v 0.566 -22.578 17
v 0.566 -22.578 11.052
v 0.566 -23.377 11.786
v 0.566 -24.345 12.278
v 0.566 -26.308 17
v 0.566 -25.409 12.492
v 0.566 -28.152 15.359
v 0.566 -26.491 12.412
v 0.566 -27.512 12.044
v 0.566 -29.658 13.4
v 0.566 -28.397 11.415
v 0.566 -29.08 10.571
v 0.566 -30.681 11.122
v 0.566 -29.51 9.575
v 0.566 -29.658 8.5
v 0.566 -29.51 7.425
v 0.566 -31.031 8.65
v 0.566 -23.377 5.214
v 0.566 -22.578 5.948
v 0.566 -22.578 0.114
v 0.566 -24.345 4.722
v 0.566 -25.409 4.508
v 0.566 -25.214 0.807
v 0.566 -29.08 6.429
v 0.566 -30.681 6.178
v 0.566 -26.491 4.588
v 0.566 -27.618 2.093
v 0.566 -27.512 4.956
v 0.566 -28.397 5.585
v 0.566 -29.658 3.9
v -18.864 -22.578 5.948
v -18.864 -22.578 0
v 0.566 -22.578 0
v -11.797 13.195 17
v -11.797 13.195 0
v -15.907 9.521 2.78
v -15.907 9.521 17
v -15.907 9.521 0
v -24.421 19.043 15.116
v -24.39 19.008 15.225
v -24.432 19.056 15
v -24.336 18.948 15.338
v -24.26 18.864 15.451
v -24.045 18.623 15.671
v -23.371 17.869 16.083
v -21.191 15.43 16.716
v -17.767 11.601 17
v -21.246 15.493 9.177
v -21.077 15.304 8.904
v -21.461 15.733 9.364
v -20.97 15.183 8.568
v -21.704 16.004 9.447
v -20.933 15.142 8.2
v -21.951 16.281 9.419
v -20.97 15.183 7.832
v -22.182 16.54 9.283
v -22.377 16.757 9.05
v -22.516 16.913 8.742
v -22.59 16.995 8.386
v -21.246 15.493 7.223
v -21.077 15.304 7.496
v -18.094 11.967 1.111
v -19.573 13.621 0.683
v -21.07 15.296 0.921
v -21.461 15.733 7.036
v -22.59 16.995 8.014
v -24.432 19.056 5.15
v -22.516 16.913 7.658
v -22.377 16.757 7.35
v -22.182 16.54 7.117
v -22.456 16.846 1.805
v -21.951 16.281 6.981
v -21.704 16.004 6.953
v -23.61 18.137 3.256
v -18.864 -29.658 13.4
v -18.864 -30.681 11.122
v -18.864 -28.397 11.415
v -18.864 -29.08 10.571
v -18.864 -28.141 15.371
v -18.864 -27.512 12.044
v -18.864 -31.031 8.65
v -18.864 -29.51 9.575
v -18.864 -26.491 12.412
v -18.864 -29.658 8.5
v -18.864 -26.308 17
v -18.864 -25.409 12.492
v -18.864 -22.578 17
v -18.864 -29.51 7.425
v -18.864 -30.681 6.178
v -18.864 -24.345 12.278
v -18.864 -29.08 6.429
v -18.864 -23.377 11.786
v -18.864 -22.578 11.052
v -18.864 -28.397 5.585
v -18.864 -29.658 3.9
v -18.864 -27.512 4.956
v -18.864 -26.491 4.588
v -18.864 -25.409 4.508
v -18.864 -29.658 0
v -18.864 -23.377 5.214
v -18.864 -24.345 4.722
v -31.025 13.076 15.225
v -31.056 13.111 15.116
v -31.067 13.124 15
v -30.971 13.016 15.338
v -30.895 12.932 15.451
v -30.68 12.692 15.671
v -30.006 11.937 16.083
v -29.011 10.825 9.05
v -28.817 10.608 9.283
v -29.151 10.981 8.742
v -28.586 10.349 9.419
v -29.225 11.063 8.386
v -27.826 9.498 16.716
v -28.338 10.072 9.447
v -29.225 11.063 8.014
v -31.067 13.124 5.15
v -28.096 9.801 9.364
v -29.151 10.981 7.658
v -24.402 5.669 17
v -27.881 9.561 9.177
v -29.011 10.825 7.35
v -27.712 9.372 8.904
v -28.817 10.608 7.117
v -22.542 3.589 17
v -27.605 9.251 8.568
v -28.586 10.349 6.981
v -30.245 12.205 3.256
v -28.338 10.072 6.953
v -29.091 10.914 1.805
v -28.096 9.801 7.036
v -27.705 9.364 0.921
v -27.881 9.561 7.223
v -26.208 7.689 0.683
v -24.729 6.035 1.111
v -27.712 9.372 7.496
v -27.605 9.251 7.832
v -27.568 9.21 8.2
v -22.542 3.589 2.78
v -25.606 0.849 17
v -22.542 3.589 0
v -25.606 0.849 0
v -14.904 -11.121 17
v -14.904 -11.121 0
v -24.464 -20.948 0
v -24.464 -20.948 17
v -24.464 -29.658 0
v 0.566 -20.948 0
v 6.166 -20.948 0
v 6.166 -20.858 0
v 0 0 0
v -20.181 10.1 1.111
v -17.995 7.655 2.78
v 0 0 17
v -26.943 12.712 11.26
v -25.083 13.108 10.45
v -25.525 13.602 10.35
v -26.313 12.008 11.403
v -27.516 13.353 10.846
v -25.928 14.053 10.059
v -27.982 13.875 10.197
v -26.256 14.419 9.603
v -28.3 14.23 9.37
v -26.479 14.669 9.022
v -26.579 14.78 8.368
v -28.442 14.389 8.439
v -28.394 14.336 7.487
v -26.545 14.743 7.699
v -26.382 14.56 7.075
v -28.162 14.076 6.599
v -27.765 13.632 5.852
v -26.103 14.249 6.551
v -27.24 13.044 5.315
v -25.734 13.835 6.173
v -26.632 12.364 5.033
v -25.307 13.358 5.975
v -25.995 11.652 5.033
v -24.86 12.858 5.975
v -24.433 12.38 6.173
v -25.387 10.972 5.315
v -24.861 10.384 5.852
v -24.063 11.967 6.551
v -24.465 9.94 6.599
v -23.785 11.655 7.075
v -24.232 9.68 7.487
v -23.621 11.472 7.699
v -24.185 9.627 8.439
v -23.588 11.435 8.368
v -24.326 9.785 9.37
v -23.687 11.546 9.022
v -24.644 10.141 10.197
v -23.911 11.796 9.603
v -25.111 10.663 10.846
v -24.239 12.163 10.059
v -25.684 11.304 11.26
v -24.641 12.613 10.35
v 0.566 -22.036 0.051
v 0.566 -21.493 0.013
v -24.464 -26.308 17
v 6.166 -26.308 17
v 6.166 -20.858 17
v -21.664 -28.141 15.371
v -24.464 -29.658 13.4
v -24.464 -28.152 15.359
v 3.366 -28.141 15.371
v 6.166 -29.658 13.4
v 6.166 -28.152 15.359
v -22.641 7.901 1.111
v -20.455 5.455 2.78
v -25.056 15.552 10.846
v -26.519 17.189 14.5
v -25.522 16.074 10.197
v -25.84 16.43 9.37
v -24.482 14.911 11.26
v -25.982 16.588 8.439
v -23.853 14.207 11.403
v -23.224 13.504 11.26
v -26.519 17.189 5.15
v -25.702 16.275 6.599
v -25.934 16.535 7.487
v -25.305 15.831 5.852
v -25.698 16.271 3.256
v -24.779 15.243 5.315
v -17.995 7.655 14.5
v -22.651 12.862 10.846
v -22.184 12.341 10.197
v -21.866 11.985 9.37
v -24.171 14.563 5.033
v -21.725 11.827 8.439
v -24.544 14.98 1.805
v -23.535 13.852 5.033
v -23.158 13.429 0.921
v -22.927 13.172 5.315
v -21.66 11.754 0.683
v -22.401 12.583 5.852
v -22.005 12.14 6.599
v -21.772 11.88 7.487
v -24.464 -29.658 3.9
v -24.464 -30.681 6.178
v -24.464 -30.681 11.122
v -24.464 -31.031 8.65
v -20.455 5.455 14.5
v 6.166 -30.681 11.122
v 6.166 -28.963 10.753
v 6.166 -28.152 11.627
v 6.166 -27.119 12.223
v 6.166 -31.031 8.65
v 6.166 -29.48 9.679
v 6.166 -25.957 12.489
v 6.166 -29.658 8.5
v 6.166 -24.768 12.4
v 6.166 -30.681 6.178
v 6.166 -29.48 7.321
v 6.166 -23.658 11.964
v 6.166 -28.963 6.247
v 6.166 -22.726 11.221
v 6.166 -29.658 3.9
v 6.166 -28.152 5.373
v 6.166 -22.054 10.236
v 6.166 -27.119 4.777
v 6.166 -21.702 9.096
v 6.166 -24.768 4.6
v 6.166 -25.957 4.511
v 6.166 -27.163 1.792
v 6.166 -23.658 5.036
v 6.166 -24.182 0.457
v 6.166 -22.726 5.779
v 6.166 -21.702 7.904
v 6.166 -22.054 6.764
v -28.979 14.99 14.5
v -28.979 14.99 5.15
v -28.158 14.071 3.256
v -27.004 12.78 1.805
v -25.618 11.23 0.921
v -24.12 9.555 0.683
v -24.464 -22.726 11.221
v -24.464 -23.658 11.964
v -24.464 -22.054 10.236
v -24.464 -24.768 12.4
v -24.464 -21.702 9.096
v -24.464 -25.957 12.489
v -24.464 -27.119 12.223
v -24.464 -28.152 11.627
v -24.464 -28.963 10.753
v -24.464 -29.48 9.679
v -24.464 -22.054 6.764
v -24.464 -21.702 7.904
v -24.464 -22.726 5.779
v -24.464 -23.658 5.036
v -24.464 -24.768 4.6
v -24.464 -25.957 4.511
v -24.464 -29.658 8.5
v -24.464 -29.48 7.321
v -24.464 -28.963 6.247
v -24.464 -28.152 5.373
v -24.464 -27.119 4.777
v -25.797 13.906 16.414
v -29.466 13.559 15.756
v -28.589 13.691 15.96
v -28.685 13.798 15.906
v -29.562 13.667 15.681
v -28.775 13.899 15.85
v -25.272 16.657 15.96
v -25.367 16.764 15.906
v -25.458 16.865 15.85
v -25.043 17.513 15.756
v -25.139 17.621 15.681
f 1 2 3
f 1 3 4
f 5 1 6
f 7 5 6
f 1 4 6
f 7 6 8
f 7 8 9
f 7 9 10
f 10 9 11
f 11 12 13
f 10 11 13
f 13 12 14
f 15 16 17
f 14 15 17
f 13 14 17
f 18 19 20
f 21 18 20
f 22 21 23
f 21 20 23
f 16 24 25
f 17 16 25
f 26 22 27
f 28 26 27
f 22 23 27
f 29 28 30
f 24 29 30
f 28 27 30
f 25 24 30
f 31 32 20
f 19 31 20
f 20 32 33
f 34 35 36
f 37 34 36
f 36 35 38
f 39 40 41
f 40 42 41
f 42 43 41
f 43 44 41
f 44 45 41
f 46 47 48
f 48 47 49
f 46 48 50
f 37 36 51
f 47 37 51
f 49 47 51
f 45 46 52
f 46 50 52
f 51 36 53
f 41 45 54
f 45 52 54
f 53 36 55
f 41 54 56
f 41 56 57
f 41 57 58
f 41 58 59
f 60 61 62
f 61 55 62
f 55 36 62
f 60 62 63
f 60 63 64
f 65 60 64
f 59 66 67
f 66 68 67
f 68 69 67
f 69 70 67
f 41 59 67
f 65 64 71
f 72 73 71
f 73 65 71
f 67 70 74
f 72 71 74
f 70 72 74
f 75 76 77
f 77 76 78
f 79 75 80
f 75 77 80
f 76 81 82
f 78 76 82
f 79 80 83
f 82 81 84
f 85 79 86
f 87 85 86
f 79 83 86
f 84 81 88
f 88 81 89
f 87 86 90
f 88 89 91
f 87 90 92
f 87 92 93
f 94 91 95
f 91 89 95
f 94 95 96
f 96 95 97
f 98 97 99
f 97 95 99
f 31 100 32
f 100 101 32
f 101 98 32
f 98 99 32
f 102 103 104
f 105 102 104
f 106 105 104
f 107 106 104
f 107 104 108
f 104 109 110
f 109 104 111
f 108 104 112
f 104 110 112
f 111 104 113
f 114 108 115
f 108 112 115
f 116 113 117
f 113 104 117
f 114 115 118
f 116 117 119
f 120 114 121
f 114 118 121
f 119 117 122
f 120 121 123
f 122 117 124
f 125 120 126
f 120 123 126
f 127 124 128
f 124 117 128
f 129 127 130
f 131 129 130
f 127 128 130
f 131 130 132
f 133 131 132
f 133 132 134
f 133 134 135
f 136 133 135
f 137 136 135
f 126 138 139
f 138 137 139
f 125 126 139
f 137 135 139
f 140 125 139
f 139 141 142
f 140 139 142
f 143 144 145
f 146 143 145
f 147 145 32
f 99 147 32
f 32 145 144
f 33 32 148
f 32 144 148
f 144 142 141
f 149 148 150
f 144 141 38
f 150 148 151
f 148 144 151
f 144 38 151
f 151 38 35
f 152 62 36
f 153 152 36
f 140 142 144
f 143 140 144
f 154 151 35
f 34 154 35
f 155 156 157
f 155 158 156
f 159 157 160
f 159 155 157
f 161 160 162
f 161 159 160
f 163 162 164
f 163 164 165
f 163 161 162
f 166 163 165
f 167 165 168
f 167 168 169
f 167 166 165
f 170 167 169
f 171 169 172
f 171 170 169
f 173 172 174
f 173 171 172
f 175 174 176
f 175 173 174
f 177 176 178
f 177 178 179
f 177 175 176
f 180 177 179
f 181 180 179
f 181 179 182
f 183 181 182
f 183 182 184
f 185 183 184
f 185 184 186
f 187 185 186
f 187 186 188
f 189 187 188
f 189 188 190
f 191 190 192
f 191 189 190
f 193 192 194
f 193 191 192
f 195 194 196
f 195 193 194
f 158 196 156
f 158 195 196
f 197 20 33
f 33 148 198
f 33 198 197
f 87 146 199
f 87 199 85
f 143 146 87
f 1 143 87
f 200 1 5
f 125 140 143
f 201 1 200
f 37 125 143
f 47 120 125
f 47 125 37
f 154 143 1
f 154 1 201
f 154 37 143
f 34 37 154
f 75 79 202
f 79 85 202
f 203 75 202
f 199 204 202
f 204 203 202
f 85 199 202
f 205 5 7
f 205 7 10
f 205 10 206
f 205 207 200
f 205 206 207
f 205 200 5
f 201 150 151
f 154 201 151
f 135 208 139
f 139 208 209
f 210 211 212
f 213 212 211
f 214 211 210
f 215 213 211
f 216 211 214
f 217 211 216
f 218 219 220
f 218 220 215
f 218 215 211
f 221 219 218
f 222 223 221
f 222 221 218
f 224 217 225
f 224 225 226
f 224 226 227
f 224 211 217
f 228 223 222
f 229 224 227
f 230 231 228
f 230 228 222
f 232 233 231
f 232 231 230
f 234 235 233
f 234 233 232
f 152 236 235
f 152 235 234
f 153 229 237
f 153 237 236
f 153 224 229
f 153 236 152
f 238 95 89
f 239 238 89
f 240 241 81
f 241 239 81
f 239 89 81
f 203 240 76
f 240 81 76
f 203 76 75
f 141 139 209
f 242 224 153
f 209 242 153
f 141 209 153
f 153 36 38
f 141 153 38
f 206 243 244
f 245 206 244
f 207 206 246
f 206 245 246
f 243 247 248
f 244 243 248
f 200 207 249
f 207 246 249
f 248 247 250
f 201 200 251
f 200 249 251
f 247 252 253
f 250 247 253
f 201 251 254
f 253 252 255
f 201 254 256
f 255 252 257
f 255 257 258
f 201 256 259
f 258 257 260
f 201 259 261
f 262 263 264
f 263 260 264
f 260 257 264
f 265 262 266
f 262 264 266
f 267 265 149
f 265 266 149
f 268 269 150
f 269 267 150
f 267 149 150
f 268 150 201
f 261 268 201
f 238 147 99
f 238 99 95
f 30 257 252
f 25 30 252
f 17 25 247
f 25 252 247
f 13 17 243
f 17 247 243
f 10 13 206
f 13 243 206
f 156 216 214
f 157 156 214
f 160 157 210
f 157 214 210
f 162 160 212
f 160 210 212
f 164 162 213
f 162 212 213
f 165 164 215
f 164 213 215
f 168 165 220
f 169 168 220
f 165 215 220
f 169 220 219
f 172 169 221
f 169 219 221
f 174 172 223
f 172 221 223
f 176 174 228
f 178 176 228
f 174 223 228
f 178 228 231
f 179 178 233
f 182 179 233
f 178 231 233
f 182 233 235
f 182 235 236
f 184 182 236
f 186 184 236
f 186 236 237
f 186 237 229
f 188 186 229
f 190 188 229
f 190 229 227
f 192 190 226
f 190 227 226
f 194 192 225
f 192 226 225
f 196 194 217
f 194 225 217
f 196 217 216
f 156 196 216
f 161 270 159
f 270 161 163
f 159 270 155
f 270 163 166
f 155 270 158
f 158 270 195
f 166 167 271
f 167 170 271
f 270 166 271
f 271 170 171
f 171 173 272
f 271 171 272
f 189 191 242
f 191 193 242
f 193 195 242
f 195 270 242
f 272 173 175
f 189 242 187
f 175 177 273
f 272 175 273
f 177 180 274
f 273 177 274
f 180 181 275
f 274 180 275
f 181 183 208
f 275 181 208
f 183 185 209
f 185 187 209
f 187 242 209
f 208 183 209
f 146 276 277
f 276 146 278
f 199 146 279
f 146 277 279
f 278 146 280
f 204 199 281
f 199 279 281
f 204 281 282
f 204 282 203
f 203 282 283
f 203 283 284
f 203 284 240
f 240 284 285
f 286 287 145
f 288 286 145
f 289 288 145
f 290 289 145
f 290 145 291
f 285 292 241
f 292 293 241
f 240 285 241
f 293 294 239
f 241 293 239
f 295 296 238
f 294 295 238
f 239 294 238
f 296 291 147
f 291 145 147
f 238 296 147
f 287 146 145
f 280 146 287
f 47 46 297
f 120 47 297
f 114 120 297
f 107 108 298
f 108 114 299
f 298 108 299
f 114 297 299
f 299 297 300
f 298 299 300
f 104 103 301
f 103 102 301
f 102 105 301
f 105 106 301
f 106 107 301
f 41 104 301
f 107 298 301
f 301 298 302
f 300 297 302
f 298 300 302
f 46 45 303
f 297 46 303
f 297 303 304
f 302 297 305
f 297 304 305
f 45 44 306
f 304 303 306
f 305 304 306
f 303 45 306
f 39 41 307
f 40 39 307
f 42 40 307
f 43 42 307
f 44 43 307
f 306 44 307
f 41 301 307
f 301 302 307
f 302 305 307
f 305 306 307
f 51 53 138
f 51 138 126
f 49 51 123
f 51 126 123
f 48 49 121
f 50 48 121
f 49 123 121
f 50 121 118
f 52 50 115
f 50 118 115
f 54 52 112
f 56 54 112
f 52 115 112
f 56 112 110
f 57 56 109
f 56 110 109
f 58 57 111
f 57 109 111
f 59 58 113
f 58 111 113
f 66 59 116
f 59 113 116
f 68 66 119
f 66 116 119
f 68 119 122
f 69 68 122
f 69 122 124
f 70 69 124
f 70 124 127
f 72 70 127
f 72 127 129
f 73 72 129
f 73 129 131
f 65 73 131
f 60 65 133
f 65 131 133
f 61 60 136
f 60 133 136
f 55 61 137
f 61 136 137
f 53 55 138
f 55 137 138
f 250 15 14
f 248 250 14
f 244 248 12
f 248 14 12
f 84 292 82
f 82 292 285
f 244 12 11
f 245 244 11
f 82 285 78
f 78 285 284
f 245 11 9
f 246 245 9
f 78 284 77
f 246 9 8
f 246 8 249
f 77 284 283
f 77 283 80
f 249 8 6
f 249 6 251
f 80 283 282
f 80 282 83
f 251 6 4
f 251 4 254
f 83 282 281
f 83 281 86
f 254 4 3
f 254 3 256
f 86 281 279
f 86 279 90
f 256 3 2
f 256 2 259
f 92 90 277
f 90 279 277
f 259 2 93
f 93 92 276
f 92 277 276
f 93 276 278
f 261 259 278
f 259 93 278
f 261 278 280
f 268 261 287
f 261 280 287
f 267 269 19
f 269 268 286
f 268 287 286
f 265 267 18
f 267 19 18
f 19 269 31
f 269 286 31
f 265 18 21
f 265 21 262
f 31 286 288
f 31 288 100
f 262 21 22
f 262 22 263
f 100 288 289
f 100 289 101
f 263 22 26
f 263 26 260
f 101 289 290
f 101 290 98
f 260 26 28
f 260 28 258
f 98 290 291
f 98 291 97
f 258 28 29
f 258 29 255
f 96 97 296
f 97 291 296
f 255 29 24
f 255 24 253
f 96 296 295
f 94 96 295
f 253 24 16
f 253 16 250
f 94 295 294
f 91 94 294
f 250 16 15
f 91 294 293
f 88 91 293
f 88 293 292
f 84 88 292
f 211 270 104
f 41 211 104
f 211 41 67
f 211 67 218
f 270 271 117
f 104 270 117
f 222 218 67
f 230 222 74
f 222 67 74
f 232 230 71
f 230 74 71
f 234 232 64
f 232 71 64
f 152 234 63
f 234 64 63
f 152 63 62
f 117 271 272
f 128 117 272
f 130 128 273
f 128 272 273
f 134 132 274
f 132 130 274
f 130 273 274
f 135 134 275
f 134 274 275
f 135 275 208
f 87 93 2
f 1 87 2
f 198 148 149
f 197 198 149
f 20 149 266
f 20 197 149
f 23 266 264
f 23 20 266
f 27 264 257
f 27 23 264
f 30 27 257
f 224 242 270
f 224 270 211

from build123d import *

# Parameters (mm, degrees)
BOSS_EXTRUDE1_DEPTH           = 17
CUT_EXTRUDE2_DEPTH            = 35
CUT_EXTRUDE3_DEPTH            = 30.5
CUT_EXTRUDE4_DEPTH            = 61
SKETCH6_R                     = 4
CUT_EXTRUDE5_DEPTH            = 61
CUT_EXTRUDE6_START            = -12.79
SKETCH7_W                     = 3.3
SKETCH7_H                     = 14.201279548
CUT_EXTRUDE6_DEPTH            = 12.79
SKETCH8_R                     = 1.25
CUT_EXTRUDE7_DEPTH            = 61
SKETCH9_R                     = 2.25
SKETCH9_R_2                   = 1.25
EXTRUDE_THIN1_DEPTH           = 1.75
EXTRUDE_THIN1_TAPER           = -30
EXTRUDE_THIN1_OTHER_WAY_DEPTH = 1.75
EXTRUDE_THIN1_OTHER_WAY_TAPER = -30
SKETCH10_R                    = 1.25
CUT_EXTRUDE9_DEPTH            = 43.000727623
FILLET1_SIZE                  = 10
FILLET1_SIZE_2                = 2


with BuildPart() as part:
    # Sketch1 → Boss-Extrude1 (new body)
    with BuildSketch(Plane.XY):
        Polygon((0, 0), (-11.797217655, 13.195289144), (-15.907217655, 9.520753176), (-24.431873803, 19.055654202), (-31.066793203, 13.123719901), (-22.542137055, 3.588818875), (-25.606127924, 0.849464945), (-14.904077823, -11.120869896), (-24.464229858, -20.947751043), (-24.464229858, -31.437751043), (-18.864229858, -31.437751043), (-18.864229858, -22.577751043), (0.565770142, -22.577751043), (0.565770142, -31.437751043), (6.165770142, -31.437751043), (6.165770142, -20.857751043), align=None)
    extrude(amount=BOSS_EXTRUDE1_DEPTH)

    # Sketch3 → Cut-Extrude2 (cut)
    with BuildSketch(Plane(origin=(-4.11, -3.674535968, 0), x_dir=(0, 0, -1), z_dir=(0.7454965618132088, 0.6665094720442348, 0))):
        with BuildLine():
            Line((-1.11054508, 20.98073524), (-2.78, 17.7))
            Line((-2.78, 17.7), (0.68, 17.7))
            Line((0.68, 17.7), (0.68, 32.569121824))
            Line((0.68, 32.569121824), (-17, 32.569121824))
            Line((-17, 32.569121824), (-17, 30.49))
            Line((-17, 30.49), (-5.15, 30.49))
            ThreePointArc((-5.15, 30.49), (-1.285745078, 26.518907223), (-1.11054508, 20.98073524))
        make_face()
    extrude(amount=-CUT_EXTRUDE2_DEPTH, mode=Mode.SUBTRACT)

    # Sketch4 → Cut-Extrude3 (cut, symmetric)
    with BuildSketch(Plane(origin=(-18.864229858, 0, 0), x_dir=(0, 0, -1), z_dir=(1, 0, 0))):
        with BuildLine():
            Line((-17, -26.307751043), (-17, -22.577751043))
            Line((-17, -22.577751043), (-18.338911285, -22.577751043))
            Line((-18.338911285, -22.577751043), (-18.338911285, -32.309712135))
            Line((-18.338911285, -32.309712135), (1.137649959, -32.309712135))
            Line((1.137649959, -32.309712135), (1.137649959, -22.577751043))
            Line((1.137649959, -22.577751043), (0, -22.577751043))
            Line((0, -22.577751043), (0, -29.657751043))
            Line((0, -29.657751043), (-3.9, -29.657751043))
            ThreePointArc((-3.9, -29.657751043), (-8.65, -31.031297694), (-13.4, -29.657751043))
            add(Edge.make_bspline(
                [(-13.4, -29.657751043), (-15.541480272, -28.298487281), (-17, -26.307751043)],
                knots=[0, 0, 0, 1, 1, 1], degree=2))
        make_face()
    extrude(amount=CUT_EXTRUDE3_DEPTH, both=True, mode=Mode.SUBTRACT)

    # Sketch5 → Cut-Extrude4 (cut)
    with BuildSketch(Plane.ZY.offset(-0.565770142)):
        with BuildLine():
            Line((3.9, -29.657751043), (0, -29.657751043))
            Line((0, -29.657751043), (0, -20.947751043))
            ThreePointArc((0, -20.947751043), (1.01950945, -25.719388602), (3.9, -29.657751043))
        make_face()
    extrude(amount=-CUT_EXTRUDE4_DEPTH, mode=Mode.SUBTRACT)

    # Sketch6 → Cut-Extrude5 (cut)
    with BuildSketch(Plane.ZY.offset(24.464229858)):
        with Locations(Location((8.5, -25.657751043, 0), (0, 0, 270))):
            Circle(SKETCH6_R)
    extrude(amount=-CUT_EXTRUDE5_DEPTH, mode=Mode.SUBTRACT)

    # Sketch7 → Cut-Extrude6 (cut)
    with BuildSketch(Plane(origin=(-20.321873803, 22.73019017, 0), x_dir=(0.7454965618132092, 0.6665094720442343, 0), z_dir=(-0.6665094720442343, 0.7454965618132092, 0)).offset(CUT_EXTRUDE6_START)):
        with Locations((-9.963103897, -7.399360226)):
            Rectangle(SKETCH7_W, SKETCH7_H)
    extrude(amount=CUT_EXTRUDE6_DEPTH, mode=Mode.SUBTRACT)

    # Sketch8 → Cut-Extrude7 (cut)
    with BuildSketch(Plane(origin=(-10.7449194, -9.606470269, 0), x_dir=(0, 0, 1), z_dir=(-0.7454965618132091, -0.6665094720442345, 0))):
        with Locations(Location((8.2, 26.49, 0), (0, 0, 270))):
            Circle(SKETCH8_R)
    extrude(amount=-CUT_EXTRUDE7_DEPTH, mode=Mode.SUBTRACT)

    # Sketch9 → Extrude-Thin1 (add)
    with BuildSketch(Plane(origin=(-7.4274597, -6.640503118, 0), x_dir=(0, 0, 1), z_dir=(-0.7454965618132092, -0.6665094720442343, 0))):
        with Locations((8.2, 26.49)):
            Circle(SKETCH9_R)
        with Locations((8.2, 26.49)):
            Circle(SKETCH9_R_2, mode=Mode.SUBTRACT)
    extrude(amount=EXTRUDE_THIN1_DEPTH, taper=EXTRUDE_THIN1_TAPER)

    # Sketch9 → Extrude-Thin1 other way (add)
    with BuildSketch(Plane(origin=(-7.4274597, -6.640503118, 0), x_dir=(0, 0, 1), z_dir=(-0.7454965618132092, -0.6665094720442343, 0))):
        with Locations((8.2, 26.49)):
            Circle(SKETCH9_R)
        with Locations((8.2, 26.49)):
            Circle(SKETCH9_R_2, mode=Mode.SUBTRACT)
    extrude(amount=-EXTRUDE_THIN1_OTHER_WAY_DEPTH, taper=EXTRUDE_THIN1_OTHER_WAY_TAPER)

    # Sketch10 → Cut-Extrude9 (cut, through all)
    with BuildSketch(Plane(origin=(-4.11, -3.674535968, 0), x_dir=(0, 0, -1), z_dir=(0.7454965618132088, 0.6665094720442348, 0))):
        with Locations(Location((-8.2, 26.49, 0), (0, 0, 270))):
            Circle(SKETCH10_R)
    extrude(amount=-CUT_EXTRUDE9_DEPTH, mode=Mode.SUBTRACT)

    # Fillet1
    # an asymmetric fillet: 10, 2 mm, written as the material it takes off along each edge
    with BuildSketch(Plane(origin=(-5.794459757, 35.718391003, 17), x_dir=(0.6665094720442343, -0.7454965618132092, 0), z_dir=(-0.7454965618132092, -0.6665094720442343, 0))) as fillet1_piece_1:
        with BuildLine():
            Bezier((FILLET1_SIZE, 0), (0, 0), (0, -FILLET1_SIZE_2), weights=[1, 0.707106781, 1])
            Line((0, -FILLET1_SIZE_2), (0, 0))
            Line((0, 0), (FILLET1_SIZE, 0))
        make_face()
    extrude(amount=58.9, mode=Mode.SUBTRACT)


solid = part.part
